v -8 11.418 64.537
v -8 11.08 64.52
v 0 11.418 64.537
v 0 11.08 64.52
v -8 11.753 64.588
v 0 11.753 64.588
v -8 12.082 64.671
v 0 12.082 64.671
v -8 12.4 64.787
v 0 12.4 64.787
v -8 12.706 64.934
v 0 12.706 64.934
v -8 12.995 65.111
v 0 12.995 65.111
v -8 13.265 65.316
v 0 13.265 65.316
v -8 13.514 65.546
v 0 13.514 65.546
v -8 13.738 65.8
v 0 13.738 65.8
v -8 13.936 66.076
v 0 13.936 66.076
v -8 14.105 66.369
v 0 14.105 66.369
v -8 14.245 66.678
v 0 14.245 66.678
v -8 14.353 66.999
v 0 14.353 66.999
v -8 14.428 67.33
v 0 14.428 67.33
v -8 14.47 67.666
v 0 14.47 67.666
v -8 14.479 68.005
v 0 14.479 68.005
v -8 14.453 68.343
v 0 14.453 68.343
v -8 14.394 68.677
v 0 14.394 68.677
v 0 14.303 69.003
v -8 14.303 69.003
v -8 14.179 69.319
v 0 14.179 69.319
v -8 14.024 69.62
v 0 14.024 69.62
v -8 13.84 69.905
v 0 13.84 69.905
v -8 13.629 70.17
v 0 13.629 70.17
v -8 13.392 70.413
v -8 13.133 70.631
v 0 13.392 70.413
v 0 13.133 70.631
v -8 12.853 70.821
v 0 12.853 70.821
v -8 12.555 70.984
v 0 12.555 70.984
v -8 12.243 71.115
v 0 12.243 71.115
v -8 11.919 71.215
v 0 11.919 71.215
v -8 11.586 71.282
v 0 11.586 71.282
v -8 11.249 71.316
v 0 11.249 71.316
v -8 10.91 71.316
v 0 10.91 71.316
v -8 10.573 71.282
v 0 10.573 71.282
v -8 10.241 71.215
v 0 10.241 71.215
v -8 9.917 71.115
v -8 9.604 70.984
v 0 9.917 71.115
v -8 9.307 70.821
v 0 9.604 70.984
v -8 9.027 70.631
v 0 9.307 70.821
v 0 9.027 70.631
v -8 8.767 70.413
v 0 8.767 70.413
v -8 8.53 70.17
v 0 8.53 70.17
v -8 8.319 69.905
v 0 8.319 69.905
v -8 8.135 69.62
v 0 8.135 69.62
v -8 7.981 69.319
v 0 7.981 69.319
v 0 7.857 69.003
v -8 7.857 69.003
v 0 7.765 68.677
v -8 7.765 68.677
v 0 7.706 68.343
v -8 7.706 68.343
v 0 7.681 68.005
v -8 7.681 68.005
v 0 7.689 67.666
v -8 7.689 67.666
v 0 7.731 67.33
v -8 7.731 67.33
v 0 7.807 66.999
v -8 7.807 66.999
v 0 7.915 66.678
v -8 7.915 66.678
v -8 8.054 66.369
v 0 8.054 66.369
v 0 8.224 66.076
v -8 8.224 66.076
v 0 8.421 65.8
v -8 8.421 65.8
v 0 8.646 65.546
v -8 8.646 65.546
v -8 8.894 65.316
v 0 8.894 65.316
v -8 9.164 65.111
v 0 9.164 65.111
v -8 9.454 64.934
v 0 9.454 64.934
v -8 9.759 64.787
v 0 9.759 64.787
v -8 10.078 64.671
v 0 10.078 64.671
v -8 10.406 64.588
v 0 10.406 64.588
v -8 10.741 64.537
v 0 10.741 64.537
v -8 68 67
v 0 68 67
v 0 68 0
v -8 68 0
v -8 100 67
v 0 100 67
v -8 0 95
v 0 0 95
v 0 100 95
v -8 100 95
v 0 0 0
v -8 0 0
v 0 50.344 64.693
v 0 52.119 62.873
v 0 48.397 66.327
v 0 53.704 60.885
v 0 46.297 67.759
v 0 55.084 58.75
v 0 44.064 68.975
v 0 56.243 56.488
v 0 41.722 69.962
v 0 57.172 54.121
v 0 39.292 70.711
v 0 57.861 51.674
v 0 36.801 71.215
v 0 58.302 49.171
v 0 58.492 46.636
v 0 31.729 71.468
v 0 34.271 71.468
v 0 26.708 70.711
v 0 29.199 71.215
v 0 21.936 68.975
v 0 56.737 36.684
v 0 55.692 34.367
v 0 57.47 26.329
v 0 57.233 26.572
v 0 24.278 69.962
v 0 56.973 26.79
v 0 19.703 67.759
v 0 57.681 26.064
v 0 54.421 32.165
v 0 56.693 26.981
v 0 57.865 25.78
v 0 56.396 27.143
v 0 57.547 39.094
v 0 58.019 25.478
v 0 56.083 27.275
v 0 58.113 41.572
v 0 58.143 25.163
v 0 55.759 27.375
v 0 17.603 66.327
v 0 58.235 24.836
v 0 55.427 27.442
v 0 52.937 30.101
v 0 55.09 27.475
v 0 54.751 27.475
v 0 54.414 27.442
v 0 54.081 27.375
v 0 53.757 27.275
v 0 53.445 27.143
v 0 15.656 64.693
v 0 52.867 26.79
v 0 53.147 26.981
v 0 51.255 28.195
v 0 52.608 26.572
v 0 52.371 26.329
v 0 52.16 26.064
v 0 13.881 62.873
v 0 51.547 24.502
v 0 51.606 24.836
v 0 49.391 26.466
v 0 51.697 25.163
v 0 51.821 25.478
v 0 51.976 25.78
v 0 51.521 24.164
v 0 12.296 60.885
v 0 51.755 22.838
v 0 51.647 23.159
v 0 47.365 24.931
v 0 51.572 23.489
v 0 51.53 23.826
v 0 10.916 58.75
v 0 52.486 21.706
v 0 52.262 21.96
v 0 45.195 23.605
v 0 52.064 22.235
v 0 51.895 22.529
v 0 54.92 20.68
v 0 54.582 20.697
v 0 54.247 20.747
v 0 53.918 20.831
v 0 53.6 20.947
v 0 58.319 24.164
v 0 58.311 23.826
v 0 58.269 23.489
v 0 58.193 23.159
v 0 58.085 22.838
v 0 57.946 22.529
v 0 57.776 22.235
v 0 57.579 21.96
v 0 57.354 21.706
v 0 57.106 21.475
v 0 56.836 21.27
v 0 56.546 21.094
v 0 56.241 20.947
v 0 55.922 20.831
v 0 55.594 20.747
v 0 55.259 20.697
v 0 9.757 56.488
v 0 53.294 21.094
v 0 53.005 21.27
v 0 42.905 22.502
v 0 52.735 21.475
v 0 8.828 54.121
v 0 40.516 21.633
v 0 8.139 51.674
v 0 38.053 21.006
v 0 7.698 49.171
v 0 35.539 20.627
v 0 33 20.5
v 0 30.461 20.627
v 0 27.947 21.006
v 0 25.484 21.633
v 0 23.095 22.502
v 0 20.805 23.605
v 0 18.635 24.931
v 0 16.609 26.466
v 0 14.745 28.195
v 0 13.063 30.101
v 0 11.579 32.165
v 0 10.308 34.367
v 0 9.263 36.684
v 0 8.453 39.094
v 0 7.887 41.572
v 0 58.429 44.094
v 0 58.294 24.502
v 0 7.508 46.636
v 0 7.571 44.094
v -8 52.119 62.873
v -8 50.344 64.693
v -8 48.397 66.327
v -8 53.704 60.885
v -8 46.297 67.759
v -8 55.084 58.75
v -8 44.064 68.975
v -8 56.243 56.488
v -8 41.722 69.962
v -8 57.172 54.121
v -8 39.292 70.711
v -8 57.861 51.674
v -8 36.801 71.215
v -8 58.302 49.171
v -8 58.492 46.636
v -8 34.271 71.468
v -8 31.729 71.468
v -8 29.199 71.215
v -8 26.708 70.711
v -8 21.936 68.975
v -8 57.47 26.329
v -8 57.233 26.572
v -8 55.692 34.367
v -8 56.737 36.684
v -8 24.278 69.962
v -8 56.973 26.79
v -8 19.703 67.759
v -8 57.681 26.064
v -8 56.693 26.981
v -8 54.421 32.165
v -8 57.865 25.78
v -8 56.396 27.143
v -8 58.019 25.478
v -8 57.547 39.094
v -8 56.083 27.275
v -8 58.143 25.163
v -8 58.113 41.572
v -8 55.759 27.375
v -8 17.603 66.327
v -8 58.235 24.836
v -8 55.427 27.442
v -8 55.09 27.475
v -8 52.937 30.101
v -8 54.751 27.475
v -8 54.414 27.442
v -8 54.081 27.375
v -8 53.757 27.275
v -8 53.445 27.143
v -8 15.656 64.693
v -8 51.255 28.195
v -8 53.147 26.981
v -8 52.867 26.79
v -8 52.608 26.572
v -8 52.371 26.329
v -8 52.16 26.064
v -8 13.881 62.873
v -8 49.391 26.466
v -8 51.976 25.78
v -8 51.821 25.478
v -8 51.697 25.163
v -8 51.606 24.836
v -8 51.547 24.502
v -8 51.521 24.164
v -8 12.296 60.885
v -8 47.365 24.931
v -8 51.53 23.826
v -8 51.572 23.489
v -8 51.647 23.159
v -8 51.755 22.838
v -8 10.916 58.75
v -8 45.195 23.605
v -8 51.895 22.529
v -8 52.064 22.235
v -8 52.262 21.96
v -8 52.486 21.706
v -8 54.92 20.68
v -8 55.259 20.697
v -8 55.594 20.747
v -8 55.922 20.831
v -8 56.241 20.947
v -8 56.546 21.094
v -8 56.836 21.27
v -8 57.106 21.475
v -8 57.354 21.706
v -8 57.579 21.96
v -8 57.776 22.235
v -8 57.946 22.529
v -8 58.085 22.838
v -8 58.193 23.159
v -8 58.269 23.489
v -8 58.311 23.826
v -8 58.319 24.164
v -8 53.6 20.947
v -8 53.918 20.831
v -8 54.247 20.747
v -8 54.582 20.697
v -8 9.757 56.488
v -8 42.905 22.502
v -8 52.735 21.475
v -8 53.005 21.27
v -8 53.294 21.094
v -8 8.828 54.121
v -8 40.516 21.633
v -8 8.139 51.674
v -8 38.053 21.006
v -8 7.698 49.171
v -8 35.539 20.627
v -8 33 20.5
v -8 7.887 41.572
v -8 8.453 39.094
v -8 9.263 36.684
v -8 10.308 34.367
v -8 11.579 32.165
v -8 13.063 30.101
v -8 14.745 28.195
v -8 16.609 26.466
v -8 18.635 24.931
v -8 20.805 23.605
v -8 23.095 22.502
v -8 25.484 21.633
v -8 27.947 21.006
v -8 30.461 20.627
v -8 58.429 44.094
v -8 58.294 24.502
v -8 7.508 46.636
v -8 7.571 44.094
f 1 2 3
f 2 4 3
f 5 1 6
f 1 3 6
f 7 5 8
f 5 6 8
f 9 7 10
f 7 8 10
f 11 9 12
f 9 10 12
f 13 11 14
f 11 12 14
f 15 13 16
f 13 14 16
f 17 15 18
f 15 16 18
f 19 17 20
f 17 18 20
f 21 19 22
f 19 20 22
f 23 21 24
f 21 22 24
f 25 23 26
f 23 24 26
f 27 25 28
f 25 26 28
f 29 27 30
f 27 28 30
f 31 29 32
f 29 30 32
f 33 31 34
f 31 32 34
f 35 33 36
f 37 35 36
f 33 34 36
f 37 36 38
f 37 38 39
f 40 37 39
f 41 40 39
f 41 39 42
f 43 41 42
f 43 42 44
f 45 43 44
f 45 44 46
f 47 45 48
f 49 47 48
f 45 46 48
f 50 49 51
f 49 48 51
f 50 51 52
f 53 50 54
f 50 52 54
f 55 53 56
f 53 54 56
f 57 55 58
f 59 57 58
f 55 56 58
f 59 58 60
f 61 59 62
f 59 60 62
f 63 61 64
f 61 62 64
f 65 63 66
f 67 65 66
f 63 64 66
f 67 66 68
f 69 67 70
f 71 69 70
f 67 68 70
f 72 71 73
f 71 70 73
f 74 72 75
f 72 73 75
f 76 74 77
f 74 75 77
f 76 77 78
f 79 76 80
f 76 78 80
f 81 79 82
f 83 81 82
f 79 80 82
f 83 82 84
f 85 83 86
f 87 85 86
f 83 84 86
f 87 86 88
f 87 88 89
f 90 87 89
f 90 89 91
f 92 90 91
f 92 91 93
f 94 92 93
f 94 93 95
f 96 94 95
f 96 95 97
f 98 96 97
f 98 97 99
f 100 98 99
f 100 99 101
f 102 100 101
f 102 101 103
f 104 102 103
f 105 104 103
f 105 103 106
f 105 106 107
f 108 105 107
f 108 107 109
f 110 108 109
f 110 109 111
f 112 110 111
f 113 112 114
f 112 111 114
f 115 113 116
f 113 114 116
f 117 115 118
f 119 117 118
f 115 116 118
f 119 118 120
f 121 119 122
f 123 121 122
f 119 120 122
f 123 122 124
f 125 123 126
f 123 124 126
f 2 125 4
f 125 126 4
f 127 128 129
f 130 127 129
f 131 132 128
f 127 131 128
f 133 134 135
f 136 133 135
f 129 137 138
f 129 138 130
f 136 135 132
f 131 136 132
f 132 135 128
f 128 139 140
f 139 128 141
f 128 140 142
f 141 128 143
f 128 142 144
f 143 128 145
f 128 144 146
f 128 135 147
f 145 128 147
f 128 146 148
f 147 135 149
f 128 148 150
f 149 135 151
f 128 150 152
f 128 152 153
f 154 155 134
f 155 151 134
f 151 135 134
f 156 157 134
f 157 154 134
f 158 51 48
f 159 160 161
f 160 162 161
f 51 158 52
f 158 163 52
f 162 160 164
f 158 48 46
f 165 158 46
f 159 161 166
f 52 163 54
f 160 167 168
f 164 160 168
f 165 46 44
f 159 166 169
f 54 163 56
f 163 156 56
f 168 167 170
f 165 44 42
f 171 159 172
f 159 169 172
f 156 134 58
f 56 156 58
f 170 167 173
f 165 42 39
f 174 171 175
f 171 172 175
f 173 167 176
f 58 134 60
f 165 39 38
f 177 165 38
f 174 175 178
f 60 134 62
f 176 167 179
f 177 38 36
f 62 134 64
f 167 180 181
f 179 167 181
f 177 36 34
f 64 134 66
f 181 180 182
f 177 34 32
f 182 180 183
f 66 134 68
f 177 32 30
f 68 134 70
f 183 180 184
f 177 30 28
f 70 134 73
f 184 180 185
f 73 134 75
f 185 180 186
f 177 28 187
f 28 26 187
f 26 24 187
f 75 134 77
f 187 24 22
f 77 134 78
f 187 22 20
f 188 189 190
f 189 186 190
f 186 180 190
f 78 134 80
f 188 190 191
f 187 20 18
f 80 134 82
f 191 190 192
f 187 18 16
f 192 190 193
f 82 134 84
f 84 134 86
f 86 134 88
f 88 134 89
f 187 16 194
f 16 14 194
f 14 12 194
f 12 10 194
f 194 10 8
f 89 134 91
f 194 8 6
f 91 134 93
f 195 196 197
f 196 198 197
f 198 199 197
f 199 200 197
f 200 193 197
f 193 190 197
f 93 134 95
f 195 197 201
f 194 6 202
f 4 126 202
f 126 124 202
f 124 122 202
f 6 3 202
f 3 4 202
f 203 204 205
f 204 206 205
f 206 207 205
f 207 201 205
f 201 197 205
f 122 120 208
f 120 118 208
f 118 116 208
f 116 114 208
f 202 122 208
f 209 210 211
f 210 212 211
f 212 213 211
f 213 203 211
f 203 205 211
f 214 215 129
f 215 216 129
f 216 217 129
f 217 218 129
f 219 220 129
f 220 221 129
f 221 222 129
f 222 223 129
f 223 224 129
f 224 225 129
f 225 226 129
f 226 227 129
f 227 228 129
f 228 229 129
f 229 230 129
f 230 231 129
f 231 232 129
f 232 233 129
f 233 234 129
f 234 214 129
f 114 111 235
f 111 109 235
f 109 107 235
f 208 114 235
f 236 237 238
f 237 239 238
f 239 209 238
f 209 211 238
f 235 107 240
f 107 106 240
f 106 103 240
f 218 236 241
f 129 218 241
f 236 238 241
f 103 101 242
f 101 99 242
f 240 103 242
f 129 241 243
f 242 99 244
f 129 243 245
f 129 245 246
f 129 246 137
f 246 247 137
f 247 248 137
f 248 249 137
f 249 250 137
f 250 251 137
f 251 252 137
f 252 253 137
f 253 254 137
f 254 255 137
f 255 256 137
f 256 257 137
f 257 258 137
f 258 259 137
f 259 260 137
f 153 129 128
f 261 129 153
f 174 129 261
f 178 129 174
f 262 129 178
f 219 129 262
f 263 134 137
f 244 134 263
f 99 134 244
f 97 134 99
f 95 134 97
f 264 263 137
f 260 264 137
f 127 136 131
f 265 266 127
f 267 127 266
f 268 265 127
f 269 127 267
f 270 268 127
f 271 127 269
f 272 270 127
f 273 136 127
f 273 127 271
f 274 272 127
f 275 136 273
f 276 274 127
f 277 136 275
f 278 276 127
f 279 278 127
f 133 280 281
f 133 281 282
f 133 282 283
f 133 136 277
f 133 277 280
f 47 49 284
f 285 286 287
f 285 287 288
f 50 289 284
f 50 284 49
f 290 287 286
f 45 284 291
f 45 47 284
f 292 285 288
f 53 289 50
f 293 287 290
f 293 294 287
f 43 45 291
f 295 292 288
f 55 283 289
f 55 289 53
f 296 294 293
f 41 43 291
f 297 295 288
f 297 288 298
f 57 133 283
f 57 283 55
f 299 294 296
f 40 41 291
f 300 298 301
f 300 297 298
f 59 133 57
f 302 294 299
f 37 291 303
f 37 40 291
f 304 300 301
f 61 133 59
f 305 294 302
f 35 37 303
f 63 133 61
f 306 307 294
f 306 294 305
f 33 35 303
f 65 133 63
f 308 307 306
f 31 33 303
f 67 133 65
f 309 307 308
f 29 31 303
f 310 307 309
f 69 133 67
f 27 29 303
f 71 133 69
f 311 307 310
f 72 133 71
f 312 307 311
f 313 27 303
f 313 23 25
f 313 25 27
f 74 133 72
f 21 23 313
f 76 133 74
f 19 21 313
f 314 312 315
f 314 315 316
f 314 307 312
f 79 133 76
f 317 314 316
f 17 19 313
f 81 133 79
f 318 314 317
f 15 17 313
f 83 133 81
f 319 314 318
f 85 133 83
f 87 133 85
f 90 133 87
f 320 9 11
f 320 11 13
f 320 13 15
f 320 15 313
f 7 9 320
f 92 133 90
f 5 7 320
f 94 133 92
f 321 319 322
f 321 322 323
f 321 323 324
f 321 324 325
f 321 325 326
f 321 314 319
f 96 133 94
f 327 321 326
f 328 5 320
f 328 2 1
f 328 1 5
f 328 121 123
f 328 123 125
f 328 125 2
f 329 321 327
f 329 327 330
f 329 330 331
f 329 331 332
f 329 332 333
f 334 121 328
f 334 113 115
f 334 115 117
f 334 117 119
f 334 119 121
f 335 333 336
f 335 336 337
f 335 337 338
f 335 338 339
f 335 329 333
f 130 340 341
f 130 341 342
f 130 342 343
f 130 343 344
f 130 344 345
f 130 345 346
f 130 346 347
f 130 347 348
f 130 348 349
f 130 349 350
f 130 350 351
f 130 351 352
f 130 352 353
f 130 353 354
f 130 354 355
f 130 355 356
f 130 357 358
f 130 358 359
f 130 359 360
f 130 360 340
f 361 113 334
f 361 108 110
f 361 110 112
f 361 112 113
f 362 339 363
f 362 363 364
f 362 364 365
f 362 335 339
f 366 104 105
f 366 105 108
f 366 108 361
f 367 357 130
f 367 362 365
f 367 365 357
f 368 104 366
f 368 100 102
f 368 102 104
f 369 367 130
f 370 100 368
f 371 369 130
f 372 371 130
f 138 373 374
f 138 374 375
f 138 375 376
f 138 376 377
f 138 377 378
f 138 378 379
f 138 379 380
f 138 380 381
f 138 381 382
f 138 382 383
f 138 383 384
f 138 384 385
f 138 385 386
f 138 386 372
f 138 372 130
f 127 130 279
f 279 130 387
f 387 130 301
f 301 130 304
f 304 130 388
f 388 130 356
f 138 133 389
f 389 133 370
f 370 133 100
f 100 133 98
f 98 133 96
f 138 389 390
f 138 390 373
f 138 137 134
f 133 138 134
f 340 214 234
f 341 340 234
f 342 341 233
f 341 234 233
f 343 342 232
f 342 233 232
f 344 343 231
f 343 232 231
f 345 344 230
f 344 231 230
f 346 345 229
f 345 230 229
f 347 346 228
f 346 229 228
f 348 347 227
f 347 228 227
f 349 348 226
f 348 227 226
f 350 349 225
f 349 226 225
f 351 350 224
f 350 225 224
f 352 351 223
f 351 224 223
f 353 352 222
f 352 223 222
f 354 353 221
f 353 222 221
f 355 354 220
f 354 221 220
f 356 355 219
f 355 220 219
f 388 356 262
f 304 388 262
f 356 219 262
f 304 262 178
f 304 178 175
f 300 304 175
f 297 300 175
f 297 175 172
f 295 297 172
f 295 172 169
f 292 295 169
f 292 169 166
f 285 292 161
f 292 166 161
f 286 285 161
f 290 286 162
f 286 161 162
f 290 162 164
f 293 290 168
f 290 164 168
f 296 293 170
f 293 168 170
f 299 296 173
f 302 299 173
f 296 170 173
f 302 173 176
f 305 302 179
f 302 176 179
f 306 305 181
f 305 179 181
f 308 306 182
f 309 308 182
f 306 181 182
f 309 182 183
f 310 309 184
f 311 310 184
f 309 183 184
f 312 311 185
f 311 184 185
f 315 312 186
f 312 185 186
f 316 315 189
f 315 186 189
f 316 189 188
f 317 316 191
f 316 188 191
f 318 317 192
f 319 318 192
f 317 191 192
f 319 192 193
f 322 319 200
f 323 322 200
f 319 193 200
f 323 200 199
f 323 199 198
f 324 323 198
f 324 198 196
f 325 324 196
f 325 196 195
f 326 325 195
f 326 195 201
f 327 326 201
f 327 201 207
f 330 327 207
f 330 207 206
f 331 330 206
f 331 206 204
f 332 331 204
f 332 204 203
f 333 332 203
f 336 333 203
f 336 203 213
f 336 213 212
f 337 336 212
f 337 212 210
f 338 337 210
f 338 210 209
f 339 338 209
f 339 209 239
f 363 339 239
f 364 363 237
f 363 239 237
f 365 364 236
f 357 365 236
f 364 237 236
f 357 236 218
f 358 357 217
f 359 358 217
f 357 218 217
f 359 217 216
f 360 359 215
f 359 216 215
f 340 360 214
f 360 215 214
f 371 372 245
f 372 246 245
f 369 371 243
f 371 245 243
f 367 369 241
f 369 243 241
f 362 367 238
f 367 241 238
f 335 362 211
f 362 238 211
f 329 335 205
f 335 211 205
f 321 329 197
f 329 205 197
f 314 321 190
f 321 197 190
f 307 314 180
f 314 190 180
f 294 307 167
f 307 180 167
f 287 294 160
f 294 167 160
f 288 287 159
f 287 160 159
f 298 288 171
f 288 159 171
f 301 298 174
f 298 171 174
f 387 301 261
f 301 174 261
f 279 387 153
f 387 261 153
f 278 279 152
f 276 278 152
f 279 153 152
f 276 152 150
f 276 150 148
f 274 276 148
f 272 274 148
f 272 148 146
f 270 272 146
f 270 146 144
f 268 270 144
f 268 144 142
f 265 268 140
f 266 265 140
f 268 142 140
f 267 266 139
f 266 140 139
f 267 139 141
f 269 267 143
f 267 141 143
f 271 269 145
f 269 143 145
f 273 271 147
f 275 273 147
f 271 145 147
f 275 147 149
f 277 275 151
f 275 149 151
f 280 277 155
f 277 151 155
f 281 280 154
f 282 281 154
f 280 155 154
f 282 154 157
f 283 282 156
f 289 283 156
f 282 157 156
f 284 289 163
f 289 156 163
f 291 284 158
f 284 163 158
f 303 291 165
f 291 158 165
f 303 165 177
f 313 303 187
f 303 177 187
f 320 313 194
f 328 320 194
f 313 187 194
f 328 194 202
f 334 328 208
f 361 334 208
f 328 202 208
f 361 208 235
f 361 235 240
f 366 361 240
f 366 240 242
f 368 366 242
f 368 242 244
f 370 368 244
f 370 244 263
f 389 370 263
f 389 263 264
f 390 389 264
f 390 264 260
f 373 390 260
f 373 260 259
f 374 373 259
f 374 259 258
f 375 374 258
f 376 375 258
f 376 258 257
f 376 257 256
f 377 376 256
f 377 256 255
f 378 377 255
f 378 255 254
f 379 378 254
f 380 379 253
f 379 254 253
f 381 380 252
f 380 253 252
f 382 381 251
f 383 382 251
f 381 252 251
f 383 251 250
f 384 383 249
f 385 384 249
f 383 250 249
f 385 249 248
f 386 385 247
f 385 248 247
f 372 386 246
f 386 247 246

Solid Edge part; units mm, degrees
sketch "Sketch1" plane through (0, 0, 0) normal (1, 0, 0) x (0, 1, 0)
  line L0 (0, 0) -> (0, 95)
  line L1 (0, 95) -> (100, 95)
  line L2 (100, 95) -> (100, 67)
  line L3 (100, 67) -> (68, 67)
  line L4 (68, 67) -> (68, 0)
  line L5 (0, 0) -> (68, 0)
  dimension "D1" = 95
extrude "Protrusion1" add sketch "Sketch1" against normal blind 8
hole "Hole_1" at (0, 33, 46) direction (-1, 0, 0) diameter 51 end through all
hole "Hole1" at (0, 54.9203, 24.0797) direction (-1, 0, 0) diameter 6.8 end through all
hole "Hole2" at (0, 11.0797, 67.9203) direction (-1, 0, 0) diameter 6.8 end through all
properties part number "88823"
